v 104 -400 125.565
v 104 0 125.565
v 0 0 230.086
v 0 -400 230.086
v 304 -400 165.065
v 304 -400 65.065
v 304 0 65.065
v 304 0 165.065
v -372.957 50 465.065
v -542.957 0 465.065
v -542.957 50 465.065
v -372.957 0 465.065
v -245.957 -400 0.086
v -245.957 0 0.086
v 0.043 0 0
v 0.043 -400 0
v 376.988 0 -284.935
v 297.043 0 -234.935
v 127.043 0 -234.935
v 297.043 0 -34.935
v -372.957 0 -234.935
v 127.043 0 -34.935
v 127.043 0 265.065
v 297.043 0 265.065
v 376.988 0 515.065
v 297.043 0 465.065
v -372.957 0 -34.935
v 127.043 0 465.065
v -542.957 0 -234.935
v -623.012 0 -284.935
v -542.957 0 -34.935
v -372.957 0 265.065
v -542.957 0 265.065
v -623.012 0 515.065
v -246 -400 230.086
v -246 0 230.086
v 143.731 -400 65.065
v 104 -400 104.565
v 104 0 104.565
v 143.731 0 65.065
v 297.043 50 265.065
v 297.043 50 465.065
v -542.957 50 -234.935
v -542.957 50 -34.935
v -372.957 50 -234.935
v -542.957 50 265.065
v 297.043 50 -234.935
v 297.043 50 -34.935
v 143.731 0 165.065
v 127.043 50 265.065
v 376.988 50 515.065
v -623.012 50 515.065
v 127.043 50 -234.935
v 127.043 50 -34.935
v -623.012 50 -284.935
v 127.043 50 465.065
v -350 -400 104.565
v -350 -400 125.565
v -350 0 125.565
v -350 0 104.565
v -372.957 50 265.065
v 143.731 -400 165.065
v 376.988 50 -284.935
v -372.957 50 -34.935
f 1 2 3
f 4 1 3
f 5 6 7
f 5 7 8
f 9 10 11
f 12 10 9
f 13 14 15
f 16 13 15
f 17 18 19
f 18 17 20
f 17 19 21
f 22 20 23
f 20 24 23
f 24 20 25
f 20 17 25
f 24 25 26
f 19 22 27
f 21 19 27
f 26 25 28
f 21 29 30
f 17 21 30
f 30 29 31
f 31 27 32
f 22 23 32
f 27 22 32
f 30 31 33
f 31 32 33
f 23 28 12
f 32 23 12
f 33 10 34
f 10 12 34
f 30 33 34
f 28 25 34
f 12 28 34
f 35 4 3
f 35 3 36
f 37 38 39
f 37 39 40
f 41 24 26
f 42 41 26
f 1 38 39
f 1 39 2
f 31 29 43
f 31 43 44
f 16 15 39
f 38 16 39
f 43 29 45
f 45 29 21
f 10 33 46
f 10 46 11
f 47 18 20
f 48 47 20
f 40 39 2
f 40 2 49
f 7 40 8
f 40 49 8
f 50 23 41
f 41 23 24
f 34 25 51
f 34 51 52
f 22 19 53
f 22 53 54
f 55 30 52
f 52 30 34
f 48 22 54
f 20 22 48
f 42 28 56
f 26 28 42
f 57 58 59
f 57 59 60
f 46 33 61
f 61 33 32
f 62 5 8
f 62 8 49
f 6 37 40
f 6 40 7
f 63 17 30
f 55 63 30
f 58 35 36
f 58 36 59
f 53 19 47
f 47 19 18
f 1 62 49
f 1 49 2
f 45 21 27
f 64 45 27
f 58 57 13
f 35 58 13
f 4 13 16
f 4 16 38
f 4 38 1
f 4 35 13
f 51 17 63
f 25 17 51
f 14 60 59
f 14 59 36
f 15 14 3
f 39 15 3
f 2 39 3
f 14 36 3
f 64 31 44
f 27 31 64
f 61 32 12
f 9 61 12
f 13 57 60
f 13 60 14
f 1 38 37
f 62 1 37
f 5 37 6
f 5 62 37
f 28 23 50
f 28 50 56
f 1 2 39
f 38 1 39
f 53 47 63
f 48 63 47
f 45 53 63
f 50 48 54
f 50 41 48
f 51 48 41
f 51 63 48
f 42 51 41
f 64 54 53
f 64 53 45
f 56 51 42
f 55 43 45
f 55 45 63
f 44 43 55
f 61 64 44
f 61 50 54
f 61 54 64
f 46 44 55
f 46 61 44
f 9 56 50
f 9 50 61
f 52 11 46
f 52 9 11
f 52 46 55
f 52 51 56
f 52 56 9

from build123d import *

# Parameters (mm, degrees)
F1_DEPTH = 400
F2_W     = 1000
F2_H     = 800
F3_DEPTH = 50
F4_W     = 170
F4_H     = 200
F6_DEPTH = 50
F8_DEPTH = 400


with BuildPart() as f1:
    # F0 (on Front) → F1 (new body)
    with BuildSketch(Plane.XZ):
        Polygon((-350, 104.564726), (-245.956617, 0.086318), (0.043368, 0), (104, 104.564726), (104, 125.564726), (0, 230.086318), (-246, 230.086318), (-350, 125.564726), align=None)
    extrude(amount=F1_DEPTH)


with BuildPart() as f3:
    # F2 (on face) → F3 (new body)
    with BuildSketch(Plane(origin=(0, 0, 0), x_dir=(-1, 0, 0), z_dir=(0, 1, 0))):
        with Locations((123.011937, 115.064726)):
            Rectangle(F2_W, F2_H)
    extrude(amount=F3_DEPTH)

    # F4 (on face) → F6 (cut, through all)
    with BuildSketch(Plane.XZ):
        with Locations((-457.956625, -134.935274)):
            Rectangle(F4_W, F4_H)
        with Locations((-457.956625, 365.064726)):
            Rectangle(F4_W, F4_H)
        with Locations((212.043375, 365.064726)):
            Rectangle(F4_W, F4_H)
        with Locations((212.043375, -134.935274)):
            Rectangle(F4_W, F4_H)
    extrude(amount=-F6_DEPTH, mode=Mode.SUBTRACT)


with BuildPart() as f8:
    # F7 (on face) → F8 (new body)
    with BuildSketch(Plane.XZ.offset(400)):
        Polygon((104, 125.564726), (104, 115.064726), (104, 104.564726), (143.731055, 65.064726), (304, 65.064726), (304, 115.064726), (304, 165.064726), (143.731055, 165.064726), align=None)
    extrude(amount=-F8_DEPTH)


solid = Compound([f1.part, f3.part, f8.part])
